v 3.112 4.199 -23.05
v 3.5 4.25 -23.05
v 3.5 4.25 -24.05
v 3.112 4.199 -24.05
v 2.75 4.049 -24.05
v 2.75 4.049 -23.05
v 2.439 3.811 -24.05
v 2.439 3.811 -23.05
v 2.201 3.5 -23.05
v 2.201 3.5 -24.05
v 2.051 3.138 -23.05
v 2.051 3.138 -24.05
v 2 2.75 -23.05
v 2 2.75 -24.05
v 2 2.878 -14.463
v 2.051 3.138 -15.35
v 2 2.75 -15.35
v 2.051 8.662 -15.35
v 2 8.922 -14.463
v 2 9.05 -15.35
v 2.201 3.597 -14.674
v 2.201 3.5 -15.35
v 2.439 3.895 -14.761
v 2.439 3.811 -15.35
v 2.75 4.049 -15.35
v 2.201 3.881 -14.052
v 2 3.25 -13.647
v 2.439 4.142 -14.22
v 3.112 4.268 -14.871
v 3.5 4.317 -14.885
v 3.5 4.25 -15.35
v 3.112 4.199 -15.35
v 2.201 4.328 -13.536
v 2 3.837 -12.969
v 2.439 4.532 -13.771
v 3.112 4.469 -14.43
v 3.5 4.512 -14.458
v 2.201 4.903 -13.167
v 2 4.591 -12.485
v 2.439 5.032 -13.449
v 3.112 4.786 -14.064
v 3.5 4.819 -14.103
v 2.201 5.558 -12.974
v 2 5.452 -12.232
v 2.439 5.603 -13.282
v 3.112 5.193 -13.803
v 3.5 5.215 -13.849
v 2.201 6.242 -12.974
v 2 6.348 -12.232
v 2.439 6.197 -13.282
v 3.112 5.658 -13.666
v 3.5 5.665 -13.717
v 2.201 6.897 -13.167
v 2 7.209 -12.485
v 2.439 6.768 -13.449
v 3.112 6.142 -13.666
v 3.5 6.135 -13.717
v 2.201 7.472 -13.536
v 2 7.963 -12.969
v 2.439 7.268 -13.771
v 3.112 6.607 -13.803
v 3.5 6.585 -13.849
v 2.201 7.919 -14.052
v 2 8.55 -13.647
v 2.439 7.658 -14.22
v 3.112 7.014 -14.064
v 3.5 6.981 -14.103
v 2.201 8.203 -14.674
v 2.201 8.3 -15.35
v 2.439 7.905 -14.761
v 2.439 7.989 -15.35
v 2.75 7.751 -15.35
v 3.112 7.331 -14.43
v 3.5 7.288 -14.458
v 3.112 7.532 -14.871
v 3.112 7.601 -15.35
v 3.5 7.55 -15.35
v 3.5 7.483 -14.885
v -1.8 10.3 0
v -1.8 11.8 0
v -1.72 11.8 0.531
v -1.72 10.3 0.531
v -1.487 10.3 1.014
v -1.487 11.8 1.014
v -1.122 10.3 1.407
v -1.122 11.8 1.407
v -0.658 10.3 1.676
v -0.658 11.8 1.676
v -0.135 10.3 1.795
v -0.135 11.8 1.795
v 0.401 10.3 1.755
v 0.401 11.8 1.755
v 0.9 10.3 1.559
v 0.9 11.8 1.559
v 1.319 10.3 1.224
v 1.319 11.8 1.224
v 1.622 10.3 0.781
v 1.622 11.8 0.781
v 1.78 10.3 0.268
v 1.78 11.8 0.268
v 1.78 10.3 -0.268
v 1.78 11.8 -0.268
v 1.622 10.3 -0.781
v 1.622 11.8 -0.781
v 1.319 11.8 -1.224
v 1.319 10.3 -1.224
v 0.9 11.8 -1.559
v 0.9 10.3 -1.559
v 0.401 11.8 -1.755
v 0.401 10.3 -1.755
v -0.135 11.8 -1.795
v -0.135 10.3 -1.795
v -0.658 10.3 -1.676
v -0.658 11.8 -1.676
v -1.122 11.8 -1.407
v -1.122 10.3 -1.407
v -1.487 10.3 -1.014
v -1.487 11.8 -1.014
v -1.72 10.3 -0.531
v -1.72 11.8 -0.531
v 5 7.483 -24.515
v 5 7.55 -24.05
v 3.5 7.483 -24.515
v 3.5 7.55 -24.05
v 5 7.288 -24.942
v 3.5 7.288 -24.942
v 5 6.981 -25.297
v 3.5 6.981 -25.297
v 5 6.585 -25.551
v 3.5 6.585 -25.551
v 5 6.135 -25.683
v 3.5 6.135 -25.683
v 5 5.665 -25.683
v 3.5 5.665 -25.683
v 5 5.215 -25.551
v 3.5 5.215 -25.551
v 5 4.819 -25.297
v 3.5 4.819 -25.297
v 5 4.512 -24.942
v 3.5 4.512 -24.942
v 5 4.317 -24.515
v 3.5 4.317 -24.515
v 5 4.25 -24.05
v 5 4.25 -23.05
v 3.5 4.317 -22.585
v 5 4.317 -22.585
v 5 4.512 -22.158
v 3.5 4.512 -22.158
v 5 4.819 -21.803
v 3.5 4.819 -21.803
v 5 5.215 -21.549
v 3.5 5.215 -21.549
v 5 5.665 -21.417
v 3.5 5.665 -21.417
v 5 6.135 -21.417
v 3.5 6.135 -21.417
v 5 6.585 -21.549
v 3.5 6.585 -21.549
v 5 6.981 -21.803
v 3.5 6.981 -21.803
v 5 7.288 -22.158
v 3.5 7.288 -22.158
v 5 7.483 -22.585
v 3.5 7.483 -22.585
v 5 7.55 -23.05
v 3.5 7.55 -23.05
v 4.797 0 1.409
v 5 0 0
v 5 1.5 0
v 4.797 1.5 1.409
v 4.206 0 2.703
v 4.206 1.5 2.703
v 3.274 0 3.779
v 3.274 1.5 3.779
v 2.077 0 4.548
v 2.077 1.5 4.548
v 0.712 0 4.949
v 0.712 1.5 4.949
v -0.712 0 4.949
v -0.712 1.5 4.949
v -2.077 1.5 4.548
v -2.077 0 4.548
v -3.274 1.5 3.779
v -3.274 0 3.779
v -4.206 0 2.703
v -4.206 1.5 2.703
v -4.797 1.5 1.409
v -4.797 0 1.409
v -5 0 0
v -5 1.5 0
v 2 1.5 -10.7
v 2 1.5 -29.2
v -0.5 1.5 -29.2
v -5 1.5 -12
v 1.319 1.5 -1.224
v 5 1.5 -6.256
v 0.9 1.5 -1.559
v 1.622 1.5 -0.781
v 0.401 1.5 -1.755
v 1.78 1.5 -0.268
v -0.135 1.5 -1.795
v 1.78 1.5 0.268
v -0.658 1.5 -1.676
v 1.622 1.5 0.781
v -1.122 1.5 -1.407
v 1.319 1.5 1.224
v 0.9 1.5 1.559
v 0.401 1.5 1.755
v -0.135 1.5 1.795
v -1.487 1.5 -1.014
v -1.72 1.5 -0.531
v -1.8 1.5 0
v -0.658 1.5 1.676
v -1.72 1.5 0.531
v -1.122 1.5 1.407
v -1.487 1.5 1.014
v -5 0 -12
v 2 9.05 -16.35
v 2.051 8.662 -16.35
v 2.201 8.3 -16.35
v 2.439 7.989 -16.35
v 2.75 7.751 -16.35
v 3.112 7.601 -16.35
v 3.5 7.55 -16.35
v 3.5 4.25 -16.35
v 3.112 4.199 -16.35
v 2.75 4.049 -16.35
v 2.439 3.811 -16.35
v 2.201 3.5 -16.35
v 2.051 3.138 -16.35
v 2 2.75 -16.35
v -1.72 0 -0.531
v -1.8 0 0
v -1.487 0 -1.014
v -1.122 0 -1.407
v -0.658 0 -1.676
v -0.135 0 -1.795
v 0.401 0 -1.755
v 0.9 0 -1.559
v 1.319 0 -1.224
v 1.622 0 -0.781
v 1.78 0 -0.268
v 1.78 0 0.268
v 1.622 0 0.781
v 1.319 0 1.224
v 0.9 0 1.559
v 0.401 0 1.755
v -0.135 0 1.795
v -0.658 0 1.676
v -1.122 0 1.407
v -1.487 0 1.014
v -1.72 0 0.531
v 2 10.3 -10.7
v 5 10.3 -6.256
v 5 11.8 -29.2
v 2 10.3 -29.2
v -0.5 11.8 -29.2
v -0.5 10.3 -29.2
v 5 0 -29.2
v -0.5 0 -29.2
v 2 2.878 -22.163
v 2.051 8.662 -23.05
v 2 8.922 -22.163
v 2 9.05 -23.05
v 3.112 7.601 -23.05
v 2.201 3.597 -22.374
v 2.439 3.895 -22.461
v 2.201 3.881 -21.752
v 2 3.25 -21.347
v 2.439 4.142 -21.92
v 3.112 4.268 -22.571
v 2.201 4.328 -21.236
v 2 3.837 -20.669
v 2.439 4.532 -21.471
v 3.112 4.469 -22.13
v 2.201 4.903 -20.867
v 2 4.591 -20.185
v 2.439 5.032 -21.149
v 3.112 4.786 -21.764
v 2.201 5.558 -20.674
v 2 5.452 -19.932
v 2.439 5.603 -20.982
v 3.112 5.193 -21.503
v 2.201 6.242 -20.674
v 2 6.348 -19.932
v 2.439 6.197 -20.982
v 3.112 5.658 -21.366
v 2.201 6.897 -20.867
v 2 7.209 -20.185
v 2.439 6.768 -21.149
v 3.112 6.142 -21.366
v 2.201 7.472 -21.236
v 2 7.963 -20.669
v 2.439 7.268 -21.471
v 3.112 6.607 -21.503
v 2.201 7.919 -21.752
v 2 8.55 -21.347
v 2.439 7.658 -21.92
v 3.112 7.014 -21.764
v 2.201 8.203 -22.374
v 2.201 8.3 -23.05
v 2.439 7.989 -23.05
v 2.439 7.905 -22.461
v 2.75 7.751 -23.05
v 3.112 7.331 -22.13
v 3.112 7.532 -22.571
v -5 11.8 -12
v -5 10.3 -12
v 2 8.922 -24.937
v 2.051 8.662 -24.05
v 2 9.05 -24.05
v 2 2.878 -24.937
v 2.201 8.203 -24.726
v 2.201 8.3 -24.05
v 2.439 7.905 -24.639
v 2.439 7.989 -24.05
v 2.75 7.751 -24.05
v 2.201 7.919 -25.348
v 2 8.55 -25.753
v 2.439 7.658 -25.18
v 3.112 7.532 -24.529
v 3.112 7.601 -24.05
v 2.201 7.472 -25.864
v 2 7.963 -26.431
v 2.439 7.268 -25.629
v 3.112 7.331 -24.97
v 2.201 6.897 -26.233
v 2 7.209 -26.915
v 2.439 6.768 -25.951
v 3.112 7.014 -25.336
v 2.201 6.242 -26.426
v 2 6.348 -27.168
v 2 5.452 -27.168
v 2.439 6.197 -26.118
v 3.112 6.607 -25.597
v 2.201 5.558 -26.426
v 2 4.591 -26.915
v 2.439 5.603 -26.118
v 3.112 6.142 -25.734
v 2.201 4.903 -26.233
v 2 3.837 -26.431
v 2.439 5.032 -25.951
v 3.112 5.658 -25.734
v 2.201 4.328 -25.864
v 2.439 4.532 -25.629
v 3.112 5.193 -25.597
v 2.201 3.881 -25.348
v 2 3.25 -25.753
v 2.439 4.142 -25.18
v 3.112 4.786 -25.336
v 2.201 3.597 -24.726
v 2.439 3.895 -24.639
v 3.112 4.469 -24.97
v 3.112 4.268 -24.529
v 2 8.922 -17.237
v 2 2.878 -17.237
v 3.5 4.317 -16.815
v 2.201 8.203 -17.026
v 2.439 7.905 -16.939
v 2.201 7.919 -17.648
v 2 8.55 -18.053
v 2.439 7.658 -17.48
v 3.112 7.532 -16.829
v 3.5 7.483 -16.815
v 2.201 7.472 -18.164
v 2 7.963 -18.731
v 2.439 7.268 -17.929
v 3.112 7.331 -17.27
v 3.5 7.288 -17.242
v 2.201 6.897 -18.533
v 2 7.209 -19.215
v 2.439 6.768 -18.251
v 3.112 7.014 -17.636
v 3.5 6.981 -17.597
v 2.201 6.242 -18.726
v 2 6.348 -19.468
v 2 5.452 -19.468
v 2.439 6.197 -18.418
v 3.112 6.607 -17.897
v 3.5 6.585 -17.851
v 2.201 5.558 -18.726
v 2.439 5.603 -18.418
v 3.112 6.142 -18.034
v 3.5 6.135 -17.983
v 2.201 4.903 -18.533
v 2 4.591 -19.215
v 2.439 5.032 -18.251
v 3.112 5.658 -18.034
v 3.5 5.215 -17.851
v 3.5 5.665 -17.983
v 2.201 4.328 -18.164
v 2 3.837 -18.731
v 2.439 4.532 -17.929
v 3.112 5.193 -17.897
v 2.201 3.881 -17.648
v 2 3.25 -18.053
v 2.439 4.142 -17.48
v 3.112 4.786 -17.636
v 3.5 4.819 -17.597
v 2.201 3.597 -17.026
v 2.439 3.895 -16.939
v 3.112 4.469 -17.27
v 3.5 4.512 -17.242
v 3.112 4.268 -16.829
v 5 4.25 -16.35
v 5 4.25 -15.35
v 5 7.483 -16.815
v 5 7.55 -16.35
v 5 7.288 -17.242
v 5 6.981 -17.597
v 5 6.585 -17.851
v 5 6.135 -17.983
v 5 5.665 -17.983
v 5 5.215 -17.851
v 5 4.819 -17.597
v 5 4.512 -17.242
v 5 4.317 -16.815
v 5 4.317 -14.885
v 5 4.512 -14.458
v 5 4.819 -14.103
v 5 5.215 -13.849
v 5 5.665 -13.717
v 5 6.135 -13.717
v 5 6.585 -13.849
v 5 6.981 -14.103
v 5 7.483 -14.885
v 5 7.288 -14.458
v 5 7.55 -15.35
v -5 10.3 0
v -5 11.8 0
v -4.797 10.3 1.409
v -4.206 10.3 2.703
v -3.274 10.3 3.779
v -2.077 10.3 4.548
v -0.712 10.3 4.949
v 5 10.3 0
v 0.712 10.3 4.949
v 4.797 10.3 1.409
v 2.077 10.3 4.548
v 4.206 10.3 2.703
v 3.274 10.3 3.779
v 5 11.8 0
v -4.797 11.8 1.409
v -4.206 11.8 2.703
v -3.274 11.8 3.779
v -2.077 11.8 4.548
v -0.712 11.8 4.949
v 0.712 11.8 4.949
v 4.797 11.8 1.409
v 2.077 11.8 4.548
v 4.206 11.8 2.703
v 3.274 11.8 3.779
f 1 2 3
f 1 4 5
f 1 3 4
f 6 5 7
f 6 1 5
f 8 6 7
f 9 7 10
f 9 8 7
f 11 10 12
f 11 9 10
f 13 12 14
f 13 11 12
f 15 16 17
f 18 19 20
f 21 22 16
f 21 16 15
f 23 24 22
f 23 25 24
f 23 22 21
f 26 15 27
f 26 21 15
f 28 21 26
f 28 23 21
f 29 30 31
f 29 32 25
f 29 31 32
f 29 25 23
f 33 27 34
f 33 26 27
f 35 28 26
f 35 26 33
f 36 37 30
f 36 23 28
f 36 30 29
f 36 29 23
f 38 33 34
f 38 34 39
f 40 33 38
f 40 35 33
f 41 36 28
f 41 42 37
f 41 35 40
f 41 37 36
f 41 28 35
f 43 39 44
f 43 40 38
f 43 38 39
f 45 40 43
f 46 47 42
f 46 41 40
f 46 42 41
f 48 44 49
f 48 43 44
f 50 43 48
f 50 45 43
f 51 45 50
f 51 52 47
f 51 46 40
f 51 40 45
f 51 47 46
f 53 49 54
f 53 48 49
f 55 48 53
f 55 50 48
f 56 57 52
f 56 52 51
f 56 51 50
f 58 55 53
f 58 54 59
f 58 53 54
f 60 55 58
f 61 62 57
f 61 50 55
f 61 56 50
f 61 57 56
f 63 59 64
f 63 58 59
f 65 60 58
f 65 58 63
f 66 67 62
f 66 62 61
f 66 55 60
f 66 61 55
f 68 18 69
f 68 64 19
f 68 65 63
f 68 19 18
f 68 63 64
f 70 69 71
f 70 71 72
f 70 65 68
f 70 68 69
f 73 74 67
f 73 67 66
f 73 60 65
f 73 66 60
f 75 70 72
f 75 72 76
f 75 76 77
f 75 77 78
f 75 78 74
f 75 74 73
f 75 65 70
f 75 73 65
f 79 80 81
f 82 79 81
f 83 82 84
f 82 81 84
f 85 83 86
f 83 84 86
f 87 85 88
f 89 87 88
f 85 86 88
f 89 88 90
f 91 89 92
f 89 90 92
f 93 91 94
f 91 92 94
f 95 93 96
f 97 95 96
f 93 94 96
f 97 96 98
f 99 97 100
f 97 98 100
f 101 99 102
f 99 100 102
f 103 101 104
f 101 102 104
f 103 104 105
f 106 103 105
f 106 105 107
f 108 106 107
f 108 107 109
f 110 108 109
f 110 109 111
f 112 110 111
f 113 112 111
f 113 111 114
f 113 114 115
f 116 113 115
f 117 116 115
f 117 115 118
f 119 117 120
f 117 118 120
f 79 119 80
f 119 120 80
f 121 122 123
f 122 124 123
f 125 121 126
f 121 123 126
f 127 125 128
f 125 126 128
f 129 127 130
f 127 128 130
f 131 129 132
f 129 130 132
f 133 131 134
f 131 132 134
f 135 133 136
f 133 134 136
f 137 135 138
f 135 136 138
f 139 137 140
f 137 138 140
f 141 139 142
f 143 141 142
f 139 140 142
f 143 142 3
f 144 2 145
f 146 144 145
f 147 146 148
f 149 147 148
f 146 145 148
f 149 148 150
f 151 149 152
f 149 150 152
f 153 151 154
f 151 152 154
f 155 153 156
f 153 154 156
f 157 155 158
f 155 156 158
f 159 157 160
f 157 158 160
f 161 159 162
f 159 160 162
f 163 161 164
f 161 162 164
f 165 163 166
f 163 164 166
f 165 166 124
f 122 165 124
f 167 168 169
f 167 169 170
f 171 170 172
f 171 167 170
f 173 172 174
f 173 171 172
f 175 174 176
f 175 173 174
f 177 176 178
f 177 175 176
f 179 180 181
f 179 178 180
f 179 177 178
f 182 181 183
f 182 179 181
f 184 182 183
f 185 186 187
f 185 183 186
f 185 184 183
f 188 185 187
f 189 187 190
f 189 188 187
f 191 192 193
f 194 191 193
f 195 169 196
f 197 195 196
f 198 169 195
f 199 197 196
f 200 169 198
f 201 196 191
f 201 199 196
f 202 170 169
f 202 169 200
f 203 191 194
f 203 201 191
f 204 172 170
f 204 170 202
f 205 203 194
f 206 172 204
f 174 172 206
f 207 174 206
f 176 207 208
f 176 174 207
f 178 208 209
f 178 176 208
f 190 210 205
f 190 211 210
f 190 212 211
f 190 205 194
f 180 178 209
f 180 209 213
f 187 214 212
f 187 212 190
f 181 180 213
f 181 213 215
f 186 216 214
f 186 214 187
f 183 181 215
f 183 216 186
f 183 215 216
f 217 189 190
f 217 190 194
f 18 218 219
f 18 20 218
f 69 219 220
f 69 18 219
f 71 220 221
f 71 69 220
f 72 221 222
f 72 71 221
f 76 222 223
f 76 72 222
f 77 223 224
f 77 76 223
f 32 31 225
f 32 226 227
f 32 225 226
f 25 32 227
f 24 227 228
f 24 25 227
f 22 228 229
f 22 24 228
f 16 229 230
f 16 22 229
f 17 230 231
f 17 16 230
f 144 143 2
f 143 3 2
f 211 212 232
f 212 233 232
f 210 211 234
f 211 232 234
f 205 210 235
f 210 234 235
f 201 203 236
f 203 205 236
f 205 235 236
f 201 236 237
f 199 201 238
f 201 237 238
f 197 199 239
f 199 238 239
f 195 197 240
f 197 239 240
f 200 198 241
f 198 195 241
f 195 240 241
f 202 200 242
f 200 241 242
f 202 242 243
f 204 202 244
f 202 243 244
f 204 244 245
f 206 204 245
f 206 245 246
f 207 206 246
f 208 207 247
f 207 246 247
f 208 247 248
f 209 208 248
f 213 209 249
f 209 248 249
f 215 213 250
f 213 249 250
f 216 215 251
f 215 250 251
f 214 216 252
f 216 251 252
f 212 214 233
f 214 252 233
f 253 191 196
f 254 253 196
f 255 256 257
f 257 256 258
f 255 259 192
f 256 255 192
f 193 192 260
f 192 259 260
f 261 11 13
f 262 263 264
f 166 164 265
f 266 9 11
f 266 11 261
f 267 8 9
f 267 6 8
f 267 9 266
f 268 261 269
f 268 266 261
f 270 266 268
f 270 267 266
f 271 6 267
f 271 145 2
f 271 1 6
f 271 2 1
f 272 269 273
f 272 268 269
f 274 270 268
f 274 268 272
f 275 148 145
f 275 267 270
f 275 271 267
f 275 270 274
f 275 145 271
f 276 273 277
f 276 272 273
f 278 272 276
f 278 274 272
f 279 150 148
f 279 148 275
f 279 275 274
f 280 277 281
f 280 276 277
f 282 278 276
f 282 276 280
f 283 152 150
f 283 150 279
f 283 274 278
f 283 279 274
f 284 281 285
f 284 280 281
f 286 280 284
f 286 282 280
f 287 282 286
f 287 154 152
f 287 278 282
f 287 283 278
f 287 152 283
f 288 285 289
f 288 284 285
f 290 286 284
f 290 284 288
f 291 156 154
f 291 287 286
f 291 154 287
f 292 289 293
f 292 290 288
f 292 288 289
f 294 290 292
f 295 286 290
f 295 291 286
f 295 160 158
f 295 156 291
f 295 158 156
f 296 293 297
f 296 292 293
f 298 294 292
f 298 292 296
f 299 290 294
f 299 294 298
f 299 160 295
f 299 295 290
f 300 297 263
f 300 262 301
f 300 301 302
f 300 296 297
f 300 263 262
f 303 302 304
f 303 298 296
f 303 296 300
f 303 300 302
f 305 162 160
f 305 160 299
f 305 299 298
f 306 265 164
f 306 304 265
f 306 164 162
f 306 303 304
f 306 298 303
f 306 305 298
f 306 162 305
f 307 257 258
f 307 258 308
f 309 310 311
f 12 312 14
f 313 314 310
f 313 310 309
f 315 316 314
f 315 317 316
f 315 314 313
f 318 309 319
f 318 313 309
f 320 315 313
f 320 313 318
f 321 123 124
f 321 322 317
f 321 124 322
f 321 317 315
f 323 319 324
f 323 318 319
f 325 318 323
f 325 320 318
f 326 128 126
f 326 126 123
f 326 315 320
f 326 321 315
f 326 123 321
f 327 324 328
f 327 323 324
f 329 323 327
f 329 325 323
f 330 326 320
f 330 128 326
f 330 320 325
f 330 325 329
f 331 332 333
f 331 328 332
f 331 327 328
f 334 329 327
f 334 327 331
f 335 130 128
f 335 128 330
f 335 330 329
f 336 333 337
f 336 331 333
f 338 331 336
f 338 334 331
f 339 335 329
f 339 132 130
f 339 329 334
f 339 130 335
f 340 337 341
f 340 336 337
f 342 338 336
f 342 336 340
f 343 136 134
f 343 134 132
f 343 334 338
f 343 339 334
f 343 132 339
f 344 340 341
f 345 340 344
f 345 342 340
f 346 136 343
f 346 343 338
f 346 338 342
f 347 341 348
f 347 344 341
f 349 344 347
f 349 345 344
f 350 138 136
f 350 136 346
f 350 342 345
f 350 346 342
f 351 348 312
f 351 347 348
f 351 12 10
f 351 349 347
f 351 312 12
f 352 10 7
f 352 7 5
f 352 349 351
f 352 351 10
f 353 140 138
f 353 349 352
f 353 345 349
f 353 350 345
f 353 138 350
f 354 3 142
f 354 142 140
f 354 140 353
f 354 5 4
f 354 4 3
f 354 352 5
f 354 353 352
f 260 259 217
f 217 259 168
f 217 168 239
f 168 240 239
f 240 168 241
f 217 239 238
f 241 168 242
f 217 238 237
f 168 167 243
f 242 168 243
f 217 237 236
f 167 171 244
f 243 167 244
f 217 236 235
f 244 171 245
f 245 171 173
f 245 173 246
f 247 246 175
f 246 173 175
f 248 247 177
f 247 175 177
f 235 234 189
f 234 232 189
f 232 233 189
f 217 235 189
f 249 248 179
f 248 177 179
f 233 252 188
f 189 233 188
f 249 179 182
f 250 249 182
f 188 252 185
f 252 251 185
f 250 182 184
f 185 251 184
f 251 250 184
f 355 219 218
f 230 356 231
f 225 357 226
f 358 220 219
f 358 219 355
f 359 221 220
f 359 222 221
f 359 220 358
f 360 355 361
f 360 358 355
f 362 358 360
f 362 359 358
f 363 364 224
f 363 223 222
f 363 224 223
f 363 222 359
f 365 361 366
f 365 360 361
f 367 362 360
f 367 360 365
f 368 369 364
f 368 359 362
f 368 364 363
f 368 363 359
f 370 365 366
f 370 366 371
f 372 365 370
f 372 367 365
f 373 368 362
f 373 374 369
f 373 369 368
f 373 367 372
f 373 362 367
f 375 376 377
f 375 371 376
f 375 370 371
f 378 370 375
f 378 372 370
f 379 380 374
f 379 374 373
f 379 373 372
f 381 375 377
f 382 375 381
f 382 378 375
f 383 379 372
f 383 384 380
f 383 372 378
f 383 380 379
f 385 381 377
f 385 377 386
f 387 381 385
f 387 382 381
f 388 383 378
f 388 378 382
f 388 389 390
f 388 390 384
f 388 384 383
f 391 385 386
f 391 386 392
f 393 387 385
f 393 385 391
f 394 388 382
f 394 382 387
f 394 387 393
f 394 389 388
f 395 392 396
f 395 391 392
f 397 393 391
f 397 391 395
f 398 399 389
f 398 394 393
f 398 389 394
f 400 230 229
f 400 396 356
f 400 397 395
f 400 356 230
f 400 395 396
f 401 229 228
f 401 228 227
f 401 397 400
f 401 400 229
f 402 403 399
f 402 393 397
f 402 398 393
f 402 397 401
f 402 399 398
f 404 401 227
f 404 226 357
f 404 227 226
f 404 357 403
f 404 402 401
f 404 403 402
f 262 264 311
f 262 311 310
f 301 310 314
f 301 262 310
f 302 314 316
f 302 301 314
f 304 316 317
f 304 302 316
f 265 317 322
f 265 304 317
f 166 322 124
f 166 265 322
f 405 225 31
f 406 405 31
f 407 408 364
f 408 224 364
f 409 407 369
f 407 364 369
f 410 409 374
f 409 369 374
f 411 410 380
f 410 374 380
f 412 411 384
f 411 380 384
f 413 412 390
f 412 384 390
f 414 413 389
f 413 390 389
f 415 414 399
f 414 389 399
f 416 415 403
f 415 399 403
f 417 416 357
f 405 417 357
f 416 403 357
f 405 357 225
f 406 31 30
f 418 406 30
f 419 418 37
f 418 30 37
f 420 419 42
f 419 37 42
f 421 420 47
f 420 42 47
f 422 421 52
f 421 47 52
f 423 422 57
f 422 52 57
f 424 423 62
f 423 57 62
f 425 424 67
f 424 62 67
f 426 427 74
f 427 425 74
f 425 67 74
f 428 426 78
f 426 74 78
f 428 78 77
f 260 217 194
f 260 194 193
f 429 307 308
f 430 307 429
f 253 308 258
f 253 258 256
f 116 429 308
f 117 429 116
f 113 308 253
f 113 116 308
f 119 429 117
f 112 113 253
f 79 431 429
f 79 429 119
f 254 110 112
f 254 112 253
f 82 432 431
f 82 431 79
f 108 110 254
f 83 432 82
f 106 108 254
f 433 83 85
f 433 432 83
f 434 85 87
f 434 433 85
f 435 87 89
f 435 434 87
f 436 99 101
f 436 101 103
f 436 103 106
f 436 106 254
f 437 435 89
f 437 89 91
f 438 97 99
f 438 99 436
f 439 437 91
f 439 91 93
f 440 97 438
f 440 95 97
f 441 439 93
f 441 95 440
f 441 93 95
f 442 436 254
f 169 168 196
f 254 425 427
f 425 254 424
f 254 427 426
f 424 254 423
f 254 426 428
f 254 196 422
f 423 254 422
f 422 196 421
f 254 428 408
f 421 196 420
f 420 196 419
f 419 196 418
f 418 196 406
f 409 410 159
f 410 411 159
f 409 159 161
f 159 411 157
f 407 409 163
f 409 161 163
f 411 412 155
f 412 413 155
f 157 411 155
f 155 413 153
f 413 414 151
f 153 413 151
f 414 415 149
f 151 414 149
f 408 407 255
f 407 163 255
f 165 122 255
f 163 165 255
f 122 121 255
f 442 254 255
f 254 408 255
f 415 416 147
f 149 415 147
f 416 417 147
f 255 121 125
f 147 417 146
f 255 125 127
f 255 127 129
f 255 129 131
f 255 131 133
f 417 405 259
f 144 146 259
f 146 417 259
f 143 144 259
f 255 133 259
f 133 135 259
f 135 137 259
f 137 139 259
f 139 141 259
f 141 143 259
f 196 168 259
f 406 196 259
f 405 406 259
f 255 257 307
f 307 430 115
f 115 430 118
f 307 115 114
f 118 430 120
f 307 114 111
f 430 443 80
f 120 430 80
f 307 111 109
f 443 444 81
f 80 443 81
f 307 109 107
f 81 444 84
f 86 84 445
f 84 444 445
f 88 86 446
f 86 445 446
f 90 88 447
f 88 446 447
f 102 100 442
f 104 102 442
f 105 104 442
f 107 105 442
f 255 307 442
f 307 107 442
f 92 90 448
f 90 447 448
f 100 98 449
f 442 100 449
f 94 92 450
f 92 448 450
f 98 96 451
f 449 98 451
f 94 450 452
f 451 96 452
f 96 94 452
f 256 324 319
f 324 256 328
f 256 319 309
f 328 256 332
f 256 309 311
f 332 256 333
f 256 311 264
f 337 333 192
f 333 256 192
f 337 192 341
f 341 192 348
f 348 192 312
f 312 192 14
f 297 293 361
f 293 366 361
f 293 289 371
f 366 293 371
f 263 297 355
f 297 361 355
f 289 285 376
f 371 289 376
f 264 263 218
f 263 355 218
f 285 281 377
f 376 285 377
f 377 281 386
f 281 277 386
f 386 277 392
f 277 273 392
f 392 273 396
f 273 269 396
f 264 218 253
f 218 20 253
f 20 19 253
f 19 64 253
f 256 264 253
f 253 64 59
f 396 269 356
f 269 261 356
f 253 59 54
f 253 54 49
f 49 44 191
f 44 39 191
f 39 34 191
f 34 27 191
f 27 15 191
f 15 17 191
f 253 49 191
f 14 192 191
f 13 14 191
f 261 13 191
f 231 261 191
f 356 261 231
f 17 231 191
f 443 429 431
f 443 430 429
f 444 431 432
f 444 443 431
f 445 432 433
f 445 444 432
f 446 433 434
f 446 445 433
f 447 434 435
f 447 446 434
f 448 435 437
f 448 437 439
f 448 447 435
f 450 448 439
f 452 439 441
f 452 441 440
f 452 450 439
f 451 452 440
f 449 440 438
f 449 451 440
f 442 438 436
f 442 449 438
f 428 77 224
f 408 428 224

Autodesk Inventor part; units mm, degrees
ref_plane "YZ Plane" through (0, 0, 0) normal (1, 0, 0) x (0, 1, 0)
ref_plane "XZ Plane" through (0, 0, 0) normal (0, 1, 0) x (-1, 0, 0)
ref_plane "XY Plane" through (0, 0, 0) normal (0, 0, 1) x (1, 0, 0)
sketch "Skizze1" plane through (0, 0, 0) normal (0, 1, 0) x (-1, 0, 0)
  arc A0 (5, 0) -> (-5, 0) centre (0, 0) ccw
  circle A1 centre (0, 0) radius 1.8
  line L0 (-5, 0) -> (-5, -29.2)
  line L1 (-5, -29.2) -> (0.5, -29.2)
  line L2 (5, 0) -> (5, -12)
  line L3 (5, -12) -> (0.5, -29.2)
  dimension "d0" = 10
  dimension "d1" = 3.6
  dimension "d2" = 29.2
  dimension "d3" = 5.5
  dimension "d4" = 12
extrude "Extrusion1" add sketch "Skizze1" along normal blind 1.5
sketch "Skizze2" plane through (0, 1.5, 0) normal (0, 1, 0) x (1, 0, 0)
  line L0 (4.9805, 29.2565) -> (5, 6.2565)
  line L1 (5, 0) -> (5, 29.2) projected
  line L2 (5, 29.2) -> (2, 29.2)
  line L3 (2, 29.2) -> (2, 10.7)
  line L4 (2, 10.7) -> (5, 6.2565)
  point P0 (0, 0)
  dimension "d7" = 23
  dimension "d8" = 3
  dimension "d9" = 18.5
extrude "Extrusion2" add sketch "Skizze2" along normal blind 4.4
sketch "Skizze3" plane through (2, 1.5, -29.2) normal (-1, 0, 0) x (0, 0, 1)
  line L0 (22.9435, 4.4) -> (0, 4.4) construction
  line L1 (0, 4.4) -> (3.5, 4.4) construction
  line L2 (0, 3.6562) -> (11.2, 3.6562) construction
  line L3 (3.5, 4.4) -> (7.8, 4.4) construction
  line L4 (11.2, 4.4) -> (15.5, 4.4) construction
  line L5 (3.5, 4.4) -> (7.8, 4.4) construction
  line L6 (5.15, 2.75) -> (6.15, 2.75)
  arc A0 (3.5, 4.4) -> (5.15, 2.75) centre (5.15, 4.4) ccw
  arc A1 (6.15, 2.75) -> (7.8, 4.4) centre (6.15, 4.4) ccw
  line L7 (11.2, 4.4) -> (15.5, 4.4) construction
  line L8 (12.85, 2.75) -> (13.85, 2.75)
  arc A2 (11.2, 4.4) -> (12.85, 2.75) centre (12.85, 4.4) ccw
  arc A3 (13.85, 2.75) -> (15.5, 4.4) centre (13.85, 4.4) ccw
  line L9 (3.5, 4.4) -> (7.8, 4.4)
  line L10 (11.2, 4.4) -> (15.5, 4.4)
  point P0 (29.2, -1.5)
  point P1 (5.65, 4.4)
  point P2 (13.35, 4.4)
extrude "Extrusion3" cut sketch "Skizze3" against normal blind 4.4
fillet "Rundung1" radius 1.5 6 edges at (2, 4.25, -23.55) (2, 4.7333, -25.2167) (2, 4.7333, -21.8833) (2, 4.7333, -17.5167) (2, 4.7333, -14.1833) (2, 4.25, -15.85)
mirror "Spiegeln1" about plane through (3.6338, 5.9, -18.2488) normal (0, 1, 0)
properties part number "chain_end_elmt"
